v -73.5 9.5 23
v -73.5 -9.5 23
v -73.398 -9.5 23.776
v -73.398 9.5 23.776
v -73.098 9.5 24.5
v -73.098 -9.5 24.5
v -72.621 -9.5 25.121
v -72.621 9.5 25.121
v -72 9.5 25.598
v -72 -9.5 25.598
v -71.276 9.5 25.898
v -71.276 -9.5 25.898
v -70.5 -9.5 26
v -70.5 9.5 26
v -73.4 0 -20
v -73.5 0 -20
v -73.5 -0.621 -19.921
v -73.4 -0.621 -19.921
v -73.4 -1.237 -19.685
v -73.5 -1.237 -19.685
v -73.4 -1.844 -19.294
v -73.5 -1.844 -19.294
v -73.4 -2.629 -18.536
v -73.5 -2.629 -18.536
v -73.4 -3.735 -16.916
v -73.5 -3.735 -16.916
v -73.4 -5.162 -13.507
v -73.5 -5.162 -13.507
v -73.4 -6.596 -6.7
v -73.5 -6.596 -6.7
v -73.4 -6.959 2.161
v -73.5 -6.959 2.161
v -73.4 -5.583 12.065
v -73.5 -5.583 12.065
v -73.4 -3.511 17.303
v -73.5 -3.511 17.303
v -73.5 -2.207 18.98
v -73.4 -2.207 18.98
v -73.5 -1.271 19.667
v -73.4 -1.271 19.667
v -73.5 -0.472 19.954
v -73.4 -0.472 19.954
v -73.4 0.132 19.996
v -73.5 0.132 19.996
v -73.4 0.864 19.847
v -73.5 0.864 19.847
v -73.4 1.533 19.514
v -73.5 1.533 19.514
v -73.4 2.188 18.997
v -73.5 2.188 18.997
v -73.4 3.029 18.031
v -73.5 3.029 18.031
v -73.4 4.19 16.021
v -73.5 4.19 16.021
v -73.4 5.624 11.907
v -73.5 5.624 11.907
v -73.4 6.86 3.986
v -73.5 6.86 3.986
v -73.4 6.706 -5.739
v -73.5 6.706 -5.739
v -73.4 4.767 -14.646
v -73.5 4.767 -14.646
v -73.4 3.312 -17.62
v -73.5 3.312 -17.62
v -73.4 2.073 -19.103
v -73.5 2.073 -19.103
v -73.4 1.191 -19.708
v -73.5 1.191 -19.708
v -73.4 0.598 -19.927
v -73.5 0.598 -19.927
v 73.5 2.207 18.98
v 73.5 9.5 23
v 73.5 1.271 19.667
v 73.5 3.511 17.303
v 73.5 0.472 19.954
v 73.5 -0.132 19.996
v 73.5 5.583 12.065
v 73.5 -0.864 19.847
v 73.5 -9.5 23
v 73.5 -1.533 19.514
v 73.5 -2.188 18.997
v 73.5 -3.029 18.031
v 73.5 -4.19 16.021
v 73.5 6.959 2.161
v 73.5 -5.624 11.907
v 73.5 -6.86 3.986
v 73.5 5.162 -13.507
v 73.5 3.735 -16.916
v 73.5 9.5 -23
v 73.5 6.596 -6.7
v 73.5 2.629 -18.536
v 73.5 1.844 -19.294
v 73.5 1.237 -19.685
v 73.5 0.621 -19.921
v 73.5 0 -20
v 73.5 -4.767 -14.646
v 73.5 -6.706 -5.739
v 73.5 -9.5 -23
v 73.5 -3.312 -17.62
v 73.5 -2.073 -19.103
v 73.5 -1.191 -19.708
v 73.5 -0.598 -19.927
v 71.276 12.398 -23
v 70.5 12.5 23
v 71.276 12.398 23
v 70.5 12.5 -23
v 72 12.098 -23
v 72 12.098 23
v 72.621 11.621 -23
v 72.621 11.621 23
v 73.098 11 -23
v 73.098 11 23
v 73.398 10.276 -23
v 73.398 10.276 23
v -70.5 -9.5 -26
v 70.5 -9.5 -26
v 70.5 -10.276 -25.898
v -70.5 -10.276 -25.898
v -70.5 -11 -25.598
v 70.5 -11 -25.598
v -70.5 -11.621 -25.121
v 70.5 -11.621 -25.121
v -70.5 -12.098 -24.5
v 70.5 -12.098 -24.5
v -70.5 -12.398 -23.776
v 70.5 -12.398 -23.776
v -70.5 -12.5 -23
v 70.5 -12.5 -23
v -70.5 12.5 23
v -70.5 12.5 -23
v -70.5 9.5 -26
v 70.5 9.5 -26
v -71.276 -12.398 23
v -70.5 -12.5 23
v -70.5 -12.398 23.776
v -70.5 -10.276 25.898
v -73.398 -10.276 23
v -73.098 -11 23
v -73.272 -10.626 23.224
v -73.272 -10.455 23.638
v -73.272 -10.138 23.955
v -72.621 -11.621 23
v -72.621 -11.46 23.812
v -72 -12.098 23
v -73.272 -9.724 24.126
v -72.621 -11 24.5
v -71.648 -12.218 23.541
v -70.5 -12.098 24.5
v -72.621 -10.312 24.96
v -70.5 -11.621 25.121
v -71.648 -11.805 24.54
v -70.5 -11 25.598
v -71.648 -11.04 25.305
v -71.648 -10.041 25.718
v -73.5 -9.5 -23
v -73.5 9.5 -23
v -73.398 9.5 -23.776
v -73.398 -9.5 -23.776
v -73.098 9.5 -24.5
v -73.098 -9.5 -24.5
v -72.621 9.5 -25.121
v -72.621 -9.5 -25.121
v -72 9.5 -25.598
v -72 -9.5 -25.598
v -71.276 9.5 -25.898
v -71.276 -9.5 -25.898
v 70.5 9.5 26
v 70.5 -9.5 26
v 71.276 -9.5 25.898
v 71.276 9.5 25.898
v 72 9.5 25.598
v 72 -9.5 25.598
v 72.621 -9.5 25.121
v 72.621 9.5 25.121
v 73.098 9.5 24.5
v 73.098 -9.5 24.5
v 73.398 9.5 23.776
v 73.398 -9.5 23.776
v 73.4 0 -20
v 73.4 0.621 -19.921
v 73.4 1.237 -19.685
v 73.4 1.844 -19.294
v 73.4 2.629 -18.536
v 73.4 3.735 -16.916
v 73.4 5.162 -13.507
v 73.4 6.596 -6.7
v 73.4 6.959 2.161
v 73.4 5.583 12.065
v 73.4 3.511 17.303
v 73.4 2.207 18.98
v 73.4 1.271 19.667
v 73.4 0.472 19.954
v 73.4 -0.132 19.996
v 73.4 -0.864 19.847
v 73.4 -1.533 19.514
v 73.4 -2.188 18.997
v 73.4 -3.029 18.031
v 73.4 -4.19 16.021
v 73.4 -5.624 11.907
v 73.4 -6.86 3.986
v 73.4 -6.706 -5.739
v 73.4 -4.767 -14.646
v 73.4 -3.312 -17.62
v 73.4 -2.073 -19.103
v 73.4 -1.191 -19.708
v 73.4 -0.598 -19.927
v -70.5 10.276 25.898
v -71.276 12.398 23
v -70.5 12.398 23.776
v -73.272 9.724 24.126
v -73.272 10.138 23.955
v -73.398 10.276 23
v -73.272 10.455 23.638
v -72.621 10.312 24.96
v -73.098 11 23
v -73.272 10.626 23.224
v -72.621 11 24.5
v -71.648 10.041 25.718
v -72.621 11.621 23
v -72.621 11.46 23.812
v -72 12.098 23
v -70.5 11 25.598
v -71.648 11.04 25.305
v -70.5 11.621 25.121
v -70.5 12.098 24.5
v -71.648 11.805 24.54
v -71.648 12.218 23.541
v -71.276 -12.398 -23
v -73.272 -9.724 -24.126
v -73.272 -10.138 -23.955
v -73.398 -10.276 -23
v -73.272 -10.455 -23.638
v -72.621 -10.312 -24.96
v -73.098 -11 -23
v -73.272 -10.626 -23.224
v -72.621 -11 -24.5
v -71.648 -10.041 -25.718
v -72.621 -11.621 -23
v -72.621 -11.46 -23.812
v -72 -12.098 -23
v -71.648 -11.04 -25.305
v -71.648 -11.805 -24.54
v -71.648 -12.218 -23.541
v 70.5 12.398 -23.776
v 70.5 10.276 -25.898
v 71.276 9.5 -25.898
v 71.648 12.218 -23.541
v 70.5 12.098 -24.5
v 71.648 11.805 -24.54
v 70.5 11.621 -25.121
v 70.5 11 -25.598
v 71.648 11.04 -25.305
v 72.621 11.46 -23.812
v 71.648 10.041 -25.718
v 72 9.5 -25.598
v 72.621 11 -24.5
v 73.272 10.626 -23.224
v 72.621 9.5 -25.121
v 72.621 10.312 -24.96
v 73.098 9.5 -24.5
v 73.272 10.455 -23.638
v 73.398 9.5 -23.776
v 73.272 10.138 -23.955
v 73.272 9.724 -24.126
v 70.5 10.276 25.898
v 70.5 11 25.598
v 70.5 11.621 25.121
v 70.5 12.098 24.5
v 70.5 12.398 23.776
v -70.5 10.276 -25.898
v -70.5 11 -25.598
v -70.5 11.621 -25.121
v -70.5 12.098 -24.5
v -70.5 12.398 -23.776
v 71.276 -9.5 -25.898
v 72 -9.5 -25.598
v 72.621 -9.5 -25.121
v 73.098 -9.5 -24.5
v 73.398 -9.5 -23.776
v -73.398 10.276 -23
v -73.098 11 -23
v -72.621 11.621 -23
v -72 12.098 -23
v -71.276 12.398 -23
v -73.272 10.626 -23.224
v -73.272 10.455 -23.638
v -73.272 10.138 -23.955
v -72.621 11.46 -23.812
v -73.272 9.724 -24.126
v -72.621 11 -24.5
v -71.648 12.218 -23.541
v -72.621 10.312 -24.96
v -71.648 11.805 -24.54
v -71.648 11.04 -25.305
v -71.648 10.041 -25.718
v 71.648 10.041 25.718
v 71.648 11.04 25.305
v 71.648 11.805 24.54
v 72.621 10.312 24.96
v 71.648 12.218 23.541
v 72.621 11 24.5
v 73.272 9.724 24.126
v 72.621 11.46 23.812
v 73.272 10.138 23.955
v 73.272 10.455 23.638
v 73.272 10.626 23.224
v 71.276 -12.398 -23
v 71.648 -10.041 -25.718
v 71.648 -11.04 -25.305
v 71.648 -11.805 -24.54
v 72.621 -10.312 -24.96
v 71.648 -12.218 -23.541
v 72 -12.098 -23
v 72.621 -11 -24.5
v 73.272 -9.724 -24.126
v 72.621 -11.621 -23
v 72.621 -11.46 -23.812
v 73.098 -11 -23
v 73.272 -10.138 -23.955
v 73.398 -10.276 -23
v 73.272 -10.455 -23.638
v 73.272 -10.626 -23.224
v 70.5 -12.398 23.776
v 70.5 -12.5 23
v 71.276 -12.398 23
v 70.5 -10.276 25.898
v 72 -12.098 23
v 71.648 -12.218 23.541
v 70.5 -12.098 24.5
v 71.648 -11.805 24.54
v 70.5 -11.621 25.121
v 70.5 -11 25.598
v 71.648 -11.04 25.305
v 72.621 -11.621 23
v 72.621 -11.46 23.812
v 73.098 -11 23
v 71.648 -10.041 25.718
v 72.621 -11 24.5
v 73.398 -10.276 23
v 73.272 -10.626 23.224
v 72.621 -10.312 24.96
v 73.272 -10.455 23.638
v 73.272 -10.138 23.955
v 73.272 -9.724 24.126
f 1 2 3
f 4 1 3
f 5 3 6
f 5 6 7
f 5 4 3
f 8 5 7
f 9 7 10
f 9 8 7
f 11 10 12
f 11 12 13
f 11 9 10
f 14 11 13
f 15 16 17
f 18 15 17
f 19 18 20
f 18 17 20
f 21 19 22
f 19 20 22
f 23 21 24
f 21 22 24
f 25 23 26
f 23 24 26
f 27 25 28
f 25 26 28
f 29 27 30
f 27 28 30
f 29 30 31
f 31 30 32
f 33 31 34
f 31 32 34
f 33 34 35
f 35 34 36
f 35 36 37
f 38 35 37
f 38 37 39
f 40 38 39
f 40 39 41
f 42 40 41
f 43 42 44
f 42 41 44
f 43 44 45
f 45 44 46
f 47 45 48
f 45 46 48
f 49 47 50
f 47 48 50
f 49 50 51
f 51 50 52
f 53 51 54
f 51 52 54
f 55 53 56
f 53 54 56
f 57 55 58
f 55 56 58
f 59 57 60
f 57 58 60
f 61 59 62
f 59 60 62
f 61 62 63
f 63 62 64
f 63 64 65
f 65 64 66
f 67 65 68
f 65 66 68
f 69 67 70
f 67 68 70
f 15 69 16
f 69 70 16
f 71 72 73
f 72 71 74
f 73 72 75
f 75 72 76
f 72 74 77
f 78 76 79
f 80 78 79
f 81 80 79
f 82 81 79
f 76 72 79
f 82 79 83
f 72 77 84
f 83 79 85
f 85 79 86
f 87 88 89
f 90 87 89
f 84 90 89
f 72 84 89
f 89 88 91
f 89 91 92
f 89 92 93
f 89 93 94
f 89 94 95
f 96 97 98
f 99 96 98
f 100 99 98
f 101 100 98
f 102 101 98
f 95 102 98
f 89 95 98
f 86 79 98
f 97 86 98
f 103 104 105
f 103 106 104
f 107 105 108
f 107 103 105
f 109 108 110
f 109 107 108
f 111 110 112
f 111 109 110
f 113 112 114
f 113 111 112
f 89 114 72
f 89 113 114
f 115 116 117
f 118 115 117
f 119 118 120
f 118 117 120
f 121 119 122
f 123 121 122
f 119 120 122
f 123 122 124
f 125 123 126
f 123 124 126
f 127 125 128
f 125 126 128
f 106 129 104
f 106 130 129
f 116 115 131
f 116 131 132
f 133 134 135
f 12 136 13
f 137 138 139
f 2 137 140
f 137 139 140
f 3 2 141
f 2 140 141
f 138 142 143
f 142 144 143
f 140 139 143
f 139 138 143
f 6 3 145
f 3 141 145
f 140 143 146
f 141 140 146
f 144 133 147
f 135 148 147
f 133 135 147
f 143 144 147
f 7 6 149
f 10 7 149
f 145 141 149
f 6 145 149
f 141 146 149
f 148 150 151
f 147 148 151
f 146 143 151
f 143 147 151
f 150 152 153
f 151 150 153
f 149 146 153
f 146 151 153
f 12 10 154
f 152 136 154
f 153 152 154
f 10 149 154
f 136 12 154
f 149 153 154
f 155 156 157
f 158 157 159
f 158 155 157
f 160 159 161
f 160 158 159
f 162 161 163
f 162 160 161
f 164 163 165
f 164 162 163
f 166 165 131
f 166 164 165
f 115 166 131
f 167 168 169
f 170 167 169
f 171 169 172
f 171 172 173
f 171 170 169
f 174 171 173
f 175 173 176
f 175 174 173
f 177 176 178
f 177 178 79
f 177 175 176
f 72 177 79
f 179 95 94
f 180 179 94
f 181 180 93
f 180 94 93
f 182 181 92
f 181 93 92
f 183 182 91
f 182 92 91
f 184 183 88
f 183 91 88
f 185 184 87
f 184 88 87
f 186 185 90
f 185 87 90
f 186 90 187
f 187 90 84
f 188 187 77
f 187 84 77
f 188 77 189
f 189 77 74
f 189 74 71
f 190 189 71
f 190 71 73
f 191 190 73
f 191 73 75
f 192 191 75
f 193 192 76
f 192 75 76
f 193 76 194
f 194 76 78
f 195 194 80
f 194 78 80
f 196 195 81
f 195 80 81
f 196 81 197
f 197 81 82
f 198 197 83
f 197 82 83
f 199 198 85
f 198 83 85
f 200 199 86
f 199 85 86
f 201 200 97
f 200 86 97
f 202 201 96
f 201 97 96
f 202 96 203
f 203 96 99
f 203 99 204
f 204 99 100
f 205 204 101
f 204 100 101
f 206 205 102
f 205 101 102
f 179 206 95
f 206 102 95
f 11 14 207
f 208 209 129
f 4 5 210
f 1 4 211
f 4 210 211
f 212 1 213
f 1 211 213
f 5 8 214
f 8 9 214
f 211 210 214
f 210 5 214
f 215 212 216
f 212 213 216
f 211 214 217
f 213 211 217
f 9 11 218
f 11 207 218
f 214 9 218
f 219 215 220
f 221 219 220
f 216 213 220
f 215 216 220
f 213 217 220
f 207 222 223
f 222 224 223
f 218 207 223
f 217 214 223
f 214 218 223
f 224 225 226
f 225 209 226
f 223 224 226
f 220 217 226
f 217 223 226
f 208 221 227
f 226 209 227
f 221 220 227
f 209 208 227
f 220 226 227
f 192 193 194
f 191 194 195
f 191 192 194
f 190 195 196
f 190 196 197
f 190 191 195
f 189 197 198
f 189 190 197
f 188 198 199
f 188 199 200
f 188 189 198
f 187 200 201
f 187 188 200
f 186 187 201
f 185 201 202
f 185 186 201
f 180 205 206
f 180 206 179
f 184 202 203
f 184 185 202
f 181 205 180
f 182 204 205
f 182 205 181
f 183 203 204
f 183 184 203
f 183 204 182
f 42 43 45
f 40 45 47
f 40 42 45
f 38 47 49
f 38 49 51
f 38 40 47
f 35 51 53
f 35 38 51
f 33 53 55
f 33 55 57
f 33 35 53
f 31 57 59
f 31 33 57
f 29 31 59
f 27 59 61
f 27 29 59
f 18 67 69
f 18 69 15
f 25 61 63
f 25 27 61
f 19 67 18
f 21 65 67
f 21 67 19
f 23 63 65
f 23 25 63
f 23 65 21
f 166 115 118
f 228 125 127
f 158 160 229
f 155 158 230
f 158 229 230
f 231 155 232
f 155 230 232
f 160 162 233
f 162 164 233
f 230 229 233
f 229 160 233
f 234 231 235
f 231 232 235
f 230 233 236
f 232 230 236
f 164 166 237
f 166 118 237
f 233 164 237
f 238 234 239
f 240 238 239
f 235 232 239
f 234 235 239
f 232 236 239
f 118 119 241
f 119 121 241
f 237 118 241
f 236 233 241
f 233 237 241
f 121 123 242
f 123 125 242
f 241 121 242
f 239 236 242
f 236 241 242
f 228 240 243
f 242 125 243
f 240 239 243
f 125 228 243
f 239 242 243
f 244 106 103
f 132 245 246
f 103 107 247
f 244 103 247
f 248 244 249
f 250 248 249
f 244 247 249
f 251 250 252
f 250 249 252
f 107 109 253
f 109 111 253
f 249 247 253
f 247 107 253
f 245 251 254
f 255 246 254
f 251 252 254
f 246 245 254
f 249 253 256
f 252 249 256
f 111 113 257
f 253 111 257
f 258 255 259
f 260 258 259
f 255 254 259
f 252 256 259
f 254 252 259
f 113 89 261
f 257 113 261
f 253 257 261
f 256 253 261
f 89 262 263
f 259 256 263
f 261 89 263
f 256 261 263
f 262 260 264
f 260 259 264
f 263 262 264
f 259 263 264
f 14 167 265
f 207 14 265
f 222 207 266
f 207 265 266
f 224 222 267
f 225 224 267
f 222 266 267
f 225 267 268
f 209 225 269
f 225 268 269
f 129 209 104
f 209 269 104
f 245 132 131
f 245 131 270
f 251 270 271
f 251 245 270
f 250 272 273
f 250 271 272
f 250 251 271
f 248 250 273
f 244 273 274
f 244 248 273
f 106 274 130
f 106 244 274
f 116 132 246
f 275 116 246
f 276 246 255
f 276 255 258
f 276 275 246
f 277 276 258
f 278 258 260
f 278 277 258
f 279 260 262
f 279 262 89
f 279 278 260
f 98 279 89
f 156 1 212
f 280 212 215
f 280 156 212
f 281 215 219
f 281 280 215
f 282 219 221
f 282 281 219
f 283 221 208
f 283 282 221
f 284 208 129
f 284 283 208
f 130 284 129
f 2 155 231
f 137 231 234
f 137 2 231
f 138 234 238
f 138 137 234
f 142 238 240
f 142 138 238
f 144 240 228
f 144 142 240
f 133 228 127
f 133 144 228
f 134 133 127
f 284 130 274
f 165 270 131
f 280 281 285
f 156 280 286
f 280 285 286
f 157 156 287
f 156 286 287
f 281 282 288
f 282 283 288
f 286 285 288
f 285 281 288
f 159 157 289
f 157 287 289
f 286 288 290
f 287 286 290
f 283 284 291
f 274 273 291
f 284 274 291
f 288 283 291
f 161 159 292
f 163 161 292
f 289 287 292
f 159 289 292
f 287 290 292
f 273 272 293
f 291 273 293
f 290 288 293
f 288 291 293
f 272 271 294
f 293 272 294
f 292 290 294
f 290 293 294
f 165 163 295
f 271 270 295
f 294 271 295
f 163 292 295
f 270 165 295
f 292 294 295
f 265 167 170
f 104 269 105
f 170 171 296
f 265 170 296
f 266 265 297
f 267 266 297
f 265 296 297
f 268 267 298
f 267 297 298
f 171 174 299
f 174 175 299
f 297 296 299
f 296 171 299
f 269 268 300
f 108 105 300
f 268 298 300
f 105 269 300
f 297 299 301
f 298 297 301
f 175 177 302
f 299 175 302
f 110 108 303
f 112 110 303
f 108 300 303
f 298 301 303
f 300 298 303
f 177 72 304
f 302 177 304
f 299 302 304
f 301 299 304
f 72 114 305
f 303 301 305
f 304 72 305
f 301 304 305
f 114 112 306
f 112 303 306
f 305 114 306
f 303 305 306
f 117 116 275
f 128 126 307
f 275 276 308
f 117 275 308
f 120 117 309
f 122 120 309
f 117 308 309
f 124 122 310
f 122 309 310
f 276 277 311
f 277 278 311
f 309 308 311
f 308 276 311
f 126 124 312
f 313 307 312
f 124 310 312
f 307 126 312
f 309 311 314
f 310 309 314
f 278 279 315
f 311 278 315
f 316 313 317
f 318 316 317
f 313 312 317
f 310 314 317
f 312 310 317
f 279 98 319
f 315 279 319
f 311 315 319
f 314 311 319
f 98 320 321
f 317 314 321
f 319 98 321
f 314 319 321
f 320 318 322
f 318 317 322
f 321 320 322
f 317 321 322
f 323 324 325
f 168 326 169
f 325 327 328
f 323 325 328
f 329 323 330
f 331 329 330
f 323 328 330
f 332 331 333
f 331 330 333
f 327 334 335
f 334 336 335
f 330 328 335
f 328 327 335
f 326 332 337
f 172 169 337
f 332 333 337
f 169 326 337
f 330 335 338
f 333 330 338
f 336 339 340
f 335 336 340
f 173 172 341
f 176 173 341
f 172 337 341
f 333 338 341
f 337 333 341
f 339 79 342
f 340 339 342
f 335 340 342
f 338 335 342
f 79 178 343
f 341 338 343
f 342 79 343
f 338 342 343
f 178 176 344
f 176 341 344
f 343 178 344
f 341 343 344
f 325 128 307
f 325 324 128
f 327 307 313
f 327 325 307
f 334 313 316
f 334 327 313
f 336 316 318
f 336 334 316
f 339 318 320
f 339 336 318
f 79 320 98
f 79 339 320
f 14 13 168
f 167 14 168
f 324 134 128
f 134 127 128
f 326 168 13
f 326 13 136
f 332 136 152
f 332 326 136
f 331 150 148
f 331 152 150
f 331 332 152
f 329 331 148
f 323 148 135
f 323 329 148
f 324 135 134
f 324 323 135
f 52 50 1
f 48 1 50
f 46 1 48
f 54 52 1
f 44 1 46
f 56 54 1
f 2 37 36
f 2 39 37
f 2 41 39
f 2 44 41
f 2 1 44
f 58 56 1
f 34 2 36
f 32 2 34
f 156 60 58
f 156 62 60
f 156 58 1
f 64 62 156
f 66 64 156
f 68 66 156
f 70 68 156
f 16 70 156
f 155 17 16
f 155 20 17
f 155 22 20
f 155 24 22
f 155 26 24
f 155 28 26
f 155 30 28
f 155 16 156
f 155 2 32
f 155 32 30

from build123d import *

# Parameters (mm, degrees)
RESSALTO_EXTRUS_O1_DEPTH      = 12.5
RESSALTO_EXTRUS_O1_DEPTH_BACK = 12.5
ESBO_O1_W                     = 147
ESBO_O1_H                     = 52
FILETE1_R                     = 3
FILETE2_R                     = 3
ESBO_O2_RX                    = 20
ESBO_O2_RY                    = 7
CORTE_EXTRUS_O1_DEPTH         = 0.1
ESBO_O3_RX                    = 20
ESBO_O3_RY                    = 7
CORTE_EXTRUS_O2_DEPTH         = 0.1


with BuildPart() as part:
    # Esboço1 → Ressalto-extrusão1 (new, two sides: drawn at the far end of the back side and taken through both)
    with BuildSketch(Plane(origin=(0, 0, 0), x_dir=(1, 0, 0), z_dir=(0, 1, 0)).offset(-RESSALTO_EXTRUS_O1_DEPTH_BACK)):
        Rectangle(ESBO_O1_W, ESBO_O1_H)
    extrude(amount=RESSALTO_EXTRUS_O1_DEPTH + RESSALTO_EXTRUS_O1_DEPTH_BACK)

    # Filete1
    filete1_edges = [part.edges().sort_by_distance(p)[0] for p in [
        (0, 12.5, -26),
        (0, -12.5, 26),
        (0, 12.5, 26),
        (0, -12.5, -26),
    ]]
    fillet(filete1_edges, radius=FILETE1_R)

    # Filete2
    filete2_edges = [part.edges().sort_by_distance(p)[0] for p in [
        (73.5, 0, 26),
        (-73.5, 0, 26),
        (73.5, 0, -26),
        (73.5, 12.5, 0),
        (73.5, -12.5, 0),
        (73.5, 11.621320344, 25.121320344),
        (73.5, 11.621320344, -25.121320344),
        (73.5, -11.621320344, -25.121320344),
        (73.5, -11.621320344, 25.121320344),
        (-73.5, -12.5, 0),
        (-73.5, 12.5, 0),
        (-73.5, 0, -26),
        (-73.5, 11.621320344, 25.121320344),
        (-73.5, 11.621320344, -25.121320344),
        (-73.5, -11.621320344, -25.121320344),
        (-73.5, -11.621320344, 25.121320344),
    ]]
    fillet(filete2_edges, radius=FILETE2_R)

    # Esboço2 → Corte-extrusão1 (cut)
    with BuildSketch(Plane(origin=(73.5, 0, 0), x_dir=(0, 0, -1), z_dir=(1, 0, 0))):
        with Locations((0, 0)):
            Ellipse(ESBO_O2_RX, ESBO_O2_RY)
    extrude(amount=-CORTE_EXTRUS_O1_DEPTH, mode=Mode.SUBTRACT)

    # Esboço3 → Corte-extrusão2 (cut)
    with BuildSketch(Plane.ZY.offset(73.5)):
        with Locations(Location((0, 0), (0, 0, 180))):
            Ellipse(ESBO_O3_RX, ESBO_O3_RY)
    extrude(amount=-CORTE_EXTRUS_O2_DEPTH, mode=Mode.SUBTRACT)


solid = part.part
